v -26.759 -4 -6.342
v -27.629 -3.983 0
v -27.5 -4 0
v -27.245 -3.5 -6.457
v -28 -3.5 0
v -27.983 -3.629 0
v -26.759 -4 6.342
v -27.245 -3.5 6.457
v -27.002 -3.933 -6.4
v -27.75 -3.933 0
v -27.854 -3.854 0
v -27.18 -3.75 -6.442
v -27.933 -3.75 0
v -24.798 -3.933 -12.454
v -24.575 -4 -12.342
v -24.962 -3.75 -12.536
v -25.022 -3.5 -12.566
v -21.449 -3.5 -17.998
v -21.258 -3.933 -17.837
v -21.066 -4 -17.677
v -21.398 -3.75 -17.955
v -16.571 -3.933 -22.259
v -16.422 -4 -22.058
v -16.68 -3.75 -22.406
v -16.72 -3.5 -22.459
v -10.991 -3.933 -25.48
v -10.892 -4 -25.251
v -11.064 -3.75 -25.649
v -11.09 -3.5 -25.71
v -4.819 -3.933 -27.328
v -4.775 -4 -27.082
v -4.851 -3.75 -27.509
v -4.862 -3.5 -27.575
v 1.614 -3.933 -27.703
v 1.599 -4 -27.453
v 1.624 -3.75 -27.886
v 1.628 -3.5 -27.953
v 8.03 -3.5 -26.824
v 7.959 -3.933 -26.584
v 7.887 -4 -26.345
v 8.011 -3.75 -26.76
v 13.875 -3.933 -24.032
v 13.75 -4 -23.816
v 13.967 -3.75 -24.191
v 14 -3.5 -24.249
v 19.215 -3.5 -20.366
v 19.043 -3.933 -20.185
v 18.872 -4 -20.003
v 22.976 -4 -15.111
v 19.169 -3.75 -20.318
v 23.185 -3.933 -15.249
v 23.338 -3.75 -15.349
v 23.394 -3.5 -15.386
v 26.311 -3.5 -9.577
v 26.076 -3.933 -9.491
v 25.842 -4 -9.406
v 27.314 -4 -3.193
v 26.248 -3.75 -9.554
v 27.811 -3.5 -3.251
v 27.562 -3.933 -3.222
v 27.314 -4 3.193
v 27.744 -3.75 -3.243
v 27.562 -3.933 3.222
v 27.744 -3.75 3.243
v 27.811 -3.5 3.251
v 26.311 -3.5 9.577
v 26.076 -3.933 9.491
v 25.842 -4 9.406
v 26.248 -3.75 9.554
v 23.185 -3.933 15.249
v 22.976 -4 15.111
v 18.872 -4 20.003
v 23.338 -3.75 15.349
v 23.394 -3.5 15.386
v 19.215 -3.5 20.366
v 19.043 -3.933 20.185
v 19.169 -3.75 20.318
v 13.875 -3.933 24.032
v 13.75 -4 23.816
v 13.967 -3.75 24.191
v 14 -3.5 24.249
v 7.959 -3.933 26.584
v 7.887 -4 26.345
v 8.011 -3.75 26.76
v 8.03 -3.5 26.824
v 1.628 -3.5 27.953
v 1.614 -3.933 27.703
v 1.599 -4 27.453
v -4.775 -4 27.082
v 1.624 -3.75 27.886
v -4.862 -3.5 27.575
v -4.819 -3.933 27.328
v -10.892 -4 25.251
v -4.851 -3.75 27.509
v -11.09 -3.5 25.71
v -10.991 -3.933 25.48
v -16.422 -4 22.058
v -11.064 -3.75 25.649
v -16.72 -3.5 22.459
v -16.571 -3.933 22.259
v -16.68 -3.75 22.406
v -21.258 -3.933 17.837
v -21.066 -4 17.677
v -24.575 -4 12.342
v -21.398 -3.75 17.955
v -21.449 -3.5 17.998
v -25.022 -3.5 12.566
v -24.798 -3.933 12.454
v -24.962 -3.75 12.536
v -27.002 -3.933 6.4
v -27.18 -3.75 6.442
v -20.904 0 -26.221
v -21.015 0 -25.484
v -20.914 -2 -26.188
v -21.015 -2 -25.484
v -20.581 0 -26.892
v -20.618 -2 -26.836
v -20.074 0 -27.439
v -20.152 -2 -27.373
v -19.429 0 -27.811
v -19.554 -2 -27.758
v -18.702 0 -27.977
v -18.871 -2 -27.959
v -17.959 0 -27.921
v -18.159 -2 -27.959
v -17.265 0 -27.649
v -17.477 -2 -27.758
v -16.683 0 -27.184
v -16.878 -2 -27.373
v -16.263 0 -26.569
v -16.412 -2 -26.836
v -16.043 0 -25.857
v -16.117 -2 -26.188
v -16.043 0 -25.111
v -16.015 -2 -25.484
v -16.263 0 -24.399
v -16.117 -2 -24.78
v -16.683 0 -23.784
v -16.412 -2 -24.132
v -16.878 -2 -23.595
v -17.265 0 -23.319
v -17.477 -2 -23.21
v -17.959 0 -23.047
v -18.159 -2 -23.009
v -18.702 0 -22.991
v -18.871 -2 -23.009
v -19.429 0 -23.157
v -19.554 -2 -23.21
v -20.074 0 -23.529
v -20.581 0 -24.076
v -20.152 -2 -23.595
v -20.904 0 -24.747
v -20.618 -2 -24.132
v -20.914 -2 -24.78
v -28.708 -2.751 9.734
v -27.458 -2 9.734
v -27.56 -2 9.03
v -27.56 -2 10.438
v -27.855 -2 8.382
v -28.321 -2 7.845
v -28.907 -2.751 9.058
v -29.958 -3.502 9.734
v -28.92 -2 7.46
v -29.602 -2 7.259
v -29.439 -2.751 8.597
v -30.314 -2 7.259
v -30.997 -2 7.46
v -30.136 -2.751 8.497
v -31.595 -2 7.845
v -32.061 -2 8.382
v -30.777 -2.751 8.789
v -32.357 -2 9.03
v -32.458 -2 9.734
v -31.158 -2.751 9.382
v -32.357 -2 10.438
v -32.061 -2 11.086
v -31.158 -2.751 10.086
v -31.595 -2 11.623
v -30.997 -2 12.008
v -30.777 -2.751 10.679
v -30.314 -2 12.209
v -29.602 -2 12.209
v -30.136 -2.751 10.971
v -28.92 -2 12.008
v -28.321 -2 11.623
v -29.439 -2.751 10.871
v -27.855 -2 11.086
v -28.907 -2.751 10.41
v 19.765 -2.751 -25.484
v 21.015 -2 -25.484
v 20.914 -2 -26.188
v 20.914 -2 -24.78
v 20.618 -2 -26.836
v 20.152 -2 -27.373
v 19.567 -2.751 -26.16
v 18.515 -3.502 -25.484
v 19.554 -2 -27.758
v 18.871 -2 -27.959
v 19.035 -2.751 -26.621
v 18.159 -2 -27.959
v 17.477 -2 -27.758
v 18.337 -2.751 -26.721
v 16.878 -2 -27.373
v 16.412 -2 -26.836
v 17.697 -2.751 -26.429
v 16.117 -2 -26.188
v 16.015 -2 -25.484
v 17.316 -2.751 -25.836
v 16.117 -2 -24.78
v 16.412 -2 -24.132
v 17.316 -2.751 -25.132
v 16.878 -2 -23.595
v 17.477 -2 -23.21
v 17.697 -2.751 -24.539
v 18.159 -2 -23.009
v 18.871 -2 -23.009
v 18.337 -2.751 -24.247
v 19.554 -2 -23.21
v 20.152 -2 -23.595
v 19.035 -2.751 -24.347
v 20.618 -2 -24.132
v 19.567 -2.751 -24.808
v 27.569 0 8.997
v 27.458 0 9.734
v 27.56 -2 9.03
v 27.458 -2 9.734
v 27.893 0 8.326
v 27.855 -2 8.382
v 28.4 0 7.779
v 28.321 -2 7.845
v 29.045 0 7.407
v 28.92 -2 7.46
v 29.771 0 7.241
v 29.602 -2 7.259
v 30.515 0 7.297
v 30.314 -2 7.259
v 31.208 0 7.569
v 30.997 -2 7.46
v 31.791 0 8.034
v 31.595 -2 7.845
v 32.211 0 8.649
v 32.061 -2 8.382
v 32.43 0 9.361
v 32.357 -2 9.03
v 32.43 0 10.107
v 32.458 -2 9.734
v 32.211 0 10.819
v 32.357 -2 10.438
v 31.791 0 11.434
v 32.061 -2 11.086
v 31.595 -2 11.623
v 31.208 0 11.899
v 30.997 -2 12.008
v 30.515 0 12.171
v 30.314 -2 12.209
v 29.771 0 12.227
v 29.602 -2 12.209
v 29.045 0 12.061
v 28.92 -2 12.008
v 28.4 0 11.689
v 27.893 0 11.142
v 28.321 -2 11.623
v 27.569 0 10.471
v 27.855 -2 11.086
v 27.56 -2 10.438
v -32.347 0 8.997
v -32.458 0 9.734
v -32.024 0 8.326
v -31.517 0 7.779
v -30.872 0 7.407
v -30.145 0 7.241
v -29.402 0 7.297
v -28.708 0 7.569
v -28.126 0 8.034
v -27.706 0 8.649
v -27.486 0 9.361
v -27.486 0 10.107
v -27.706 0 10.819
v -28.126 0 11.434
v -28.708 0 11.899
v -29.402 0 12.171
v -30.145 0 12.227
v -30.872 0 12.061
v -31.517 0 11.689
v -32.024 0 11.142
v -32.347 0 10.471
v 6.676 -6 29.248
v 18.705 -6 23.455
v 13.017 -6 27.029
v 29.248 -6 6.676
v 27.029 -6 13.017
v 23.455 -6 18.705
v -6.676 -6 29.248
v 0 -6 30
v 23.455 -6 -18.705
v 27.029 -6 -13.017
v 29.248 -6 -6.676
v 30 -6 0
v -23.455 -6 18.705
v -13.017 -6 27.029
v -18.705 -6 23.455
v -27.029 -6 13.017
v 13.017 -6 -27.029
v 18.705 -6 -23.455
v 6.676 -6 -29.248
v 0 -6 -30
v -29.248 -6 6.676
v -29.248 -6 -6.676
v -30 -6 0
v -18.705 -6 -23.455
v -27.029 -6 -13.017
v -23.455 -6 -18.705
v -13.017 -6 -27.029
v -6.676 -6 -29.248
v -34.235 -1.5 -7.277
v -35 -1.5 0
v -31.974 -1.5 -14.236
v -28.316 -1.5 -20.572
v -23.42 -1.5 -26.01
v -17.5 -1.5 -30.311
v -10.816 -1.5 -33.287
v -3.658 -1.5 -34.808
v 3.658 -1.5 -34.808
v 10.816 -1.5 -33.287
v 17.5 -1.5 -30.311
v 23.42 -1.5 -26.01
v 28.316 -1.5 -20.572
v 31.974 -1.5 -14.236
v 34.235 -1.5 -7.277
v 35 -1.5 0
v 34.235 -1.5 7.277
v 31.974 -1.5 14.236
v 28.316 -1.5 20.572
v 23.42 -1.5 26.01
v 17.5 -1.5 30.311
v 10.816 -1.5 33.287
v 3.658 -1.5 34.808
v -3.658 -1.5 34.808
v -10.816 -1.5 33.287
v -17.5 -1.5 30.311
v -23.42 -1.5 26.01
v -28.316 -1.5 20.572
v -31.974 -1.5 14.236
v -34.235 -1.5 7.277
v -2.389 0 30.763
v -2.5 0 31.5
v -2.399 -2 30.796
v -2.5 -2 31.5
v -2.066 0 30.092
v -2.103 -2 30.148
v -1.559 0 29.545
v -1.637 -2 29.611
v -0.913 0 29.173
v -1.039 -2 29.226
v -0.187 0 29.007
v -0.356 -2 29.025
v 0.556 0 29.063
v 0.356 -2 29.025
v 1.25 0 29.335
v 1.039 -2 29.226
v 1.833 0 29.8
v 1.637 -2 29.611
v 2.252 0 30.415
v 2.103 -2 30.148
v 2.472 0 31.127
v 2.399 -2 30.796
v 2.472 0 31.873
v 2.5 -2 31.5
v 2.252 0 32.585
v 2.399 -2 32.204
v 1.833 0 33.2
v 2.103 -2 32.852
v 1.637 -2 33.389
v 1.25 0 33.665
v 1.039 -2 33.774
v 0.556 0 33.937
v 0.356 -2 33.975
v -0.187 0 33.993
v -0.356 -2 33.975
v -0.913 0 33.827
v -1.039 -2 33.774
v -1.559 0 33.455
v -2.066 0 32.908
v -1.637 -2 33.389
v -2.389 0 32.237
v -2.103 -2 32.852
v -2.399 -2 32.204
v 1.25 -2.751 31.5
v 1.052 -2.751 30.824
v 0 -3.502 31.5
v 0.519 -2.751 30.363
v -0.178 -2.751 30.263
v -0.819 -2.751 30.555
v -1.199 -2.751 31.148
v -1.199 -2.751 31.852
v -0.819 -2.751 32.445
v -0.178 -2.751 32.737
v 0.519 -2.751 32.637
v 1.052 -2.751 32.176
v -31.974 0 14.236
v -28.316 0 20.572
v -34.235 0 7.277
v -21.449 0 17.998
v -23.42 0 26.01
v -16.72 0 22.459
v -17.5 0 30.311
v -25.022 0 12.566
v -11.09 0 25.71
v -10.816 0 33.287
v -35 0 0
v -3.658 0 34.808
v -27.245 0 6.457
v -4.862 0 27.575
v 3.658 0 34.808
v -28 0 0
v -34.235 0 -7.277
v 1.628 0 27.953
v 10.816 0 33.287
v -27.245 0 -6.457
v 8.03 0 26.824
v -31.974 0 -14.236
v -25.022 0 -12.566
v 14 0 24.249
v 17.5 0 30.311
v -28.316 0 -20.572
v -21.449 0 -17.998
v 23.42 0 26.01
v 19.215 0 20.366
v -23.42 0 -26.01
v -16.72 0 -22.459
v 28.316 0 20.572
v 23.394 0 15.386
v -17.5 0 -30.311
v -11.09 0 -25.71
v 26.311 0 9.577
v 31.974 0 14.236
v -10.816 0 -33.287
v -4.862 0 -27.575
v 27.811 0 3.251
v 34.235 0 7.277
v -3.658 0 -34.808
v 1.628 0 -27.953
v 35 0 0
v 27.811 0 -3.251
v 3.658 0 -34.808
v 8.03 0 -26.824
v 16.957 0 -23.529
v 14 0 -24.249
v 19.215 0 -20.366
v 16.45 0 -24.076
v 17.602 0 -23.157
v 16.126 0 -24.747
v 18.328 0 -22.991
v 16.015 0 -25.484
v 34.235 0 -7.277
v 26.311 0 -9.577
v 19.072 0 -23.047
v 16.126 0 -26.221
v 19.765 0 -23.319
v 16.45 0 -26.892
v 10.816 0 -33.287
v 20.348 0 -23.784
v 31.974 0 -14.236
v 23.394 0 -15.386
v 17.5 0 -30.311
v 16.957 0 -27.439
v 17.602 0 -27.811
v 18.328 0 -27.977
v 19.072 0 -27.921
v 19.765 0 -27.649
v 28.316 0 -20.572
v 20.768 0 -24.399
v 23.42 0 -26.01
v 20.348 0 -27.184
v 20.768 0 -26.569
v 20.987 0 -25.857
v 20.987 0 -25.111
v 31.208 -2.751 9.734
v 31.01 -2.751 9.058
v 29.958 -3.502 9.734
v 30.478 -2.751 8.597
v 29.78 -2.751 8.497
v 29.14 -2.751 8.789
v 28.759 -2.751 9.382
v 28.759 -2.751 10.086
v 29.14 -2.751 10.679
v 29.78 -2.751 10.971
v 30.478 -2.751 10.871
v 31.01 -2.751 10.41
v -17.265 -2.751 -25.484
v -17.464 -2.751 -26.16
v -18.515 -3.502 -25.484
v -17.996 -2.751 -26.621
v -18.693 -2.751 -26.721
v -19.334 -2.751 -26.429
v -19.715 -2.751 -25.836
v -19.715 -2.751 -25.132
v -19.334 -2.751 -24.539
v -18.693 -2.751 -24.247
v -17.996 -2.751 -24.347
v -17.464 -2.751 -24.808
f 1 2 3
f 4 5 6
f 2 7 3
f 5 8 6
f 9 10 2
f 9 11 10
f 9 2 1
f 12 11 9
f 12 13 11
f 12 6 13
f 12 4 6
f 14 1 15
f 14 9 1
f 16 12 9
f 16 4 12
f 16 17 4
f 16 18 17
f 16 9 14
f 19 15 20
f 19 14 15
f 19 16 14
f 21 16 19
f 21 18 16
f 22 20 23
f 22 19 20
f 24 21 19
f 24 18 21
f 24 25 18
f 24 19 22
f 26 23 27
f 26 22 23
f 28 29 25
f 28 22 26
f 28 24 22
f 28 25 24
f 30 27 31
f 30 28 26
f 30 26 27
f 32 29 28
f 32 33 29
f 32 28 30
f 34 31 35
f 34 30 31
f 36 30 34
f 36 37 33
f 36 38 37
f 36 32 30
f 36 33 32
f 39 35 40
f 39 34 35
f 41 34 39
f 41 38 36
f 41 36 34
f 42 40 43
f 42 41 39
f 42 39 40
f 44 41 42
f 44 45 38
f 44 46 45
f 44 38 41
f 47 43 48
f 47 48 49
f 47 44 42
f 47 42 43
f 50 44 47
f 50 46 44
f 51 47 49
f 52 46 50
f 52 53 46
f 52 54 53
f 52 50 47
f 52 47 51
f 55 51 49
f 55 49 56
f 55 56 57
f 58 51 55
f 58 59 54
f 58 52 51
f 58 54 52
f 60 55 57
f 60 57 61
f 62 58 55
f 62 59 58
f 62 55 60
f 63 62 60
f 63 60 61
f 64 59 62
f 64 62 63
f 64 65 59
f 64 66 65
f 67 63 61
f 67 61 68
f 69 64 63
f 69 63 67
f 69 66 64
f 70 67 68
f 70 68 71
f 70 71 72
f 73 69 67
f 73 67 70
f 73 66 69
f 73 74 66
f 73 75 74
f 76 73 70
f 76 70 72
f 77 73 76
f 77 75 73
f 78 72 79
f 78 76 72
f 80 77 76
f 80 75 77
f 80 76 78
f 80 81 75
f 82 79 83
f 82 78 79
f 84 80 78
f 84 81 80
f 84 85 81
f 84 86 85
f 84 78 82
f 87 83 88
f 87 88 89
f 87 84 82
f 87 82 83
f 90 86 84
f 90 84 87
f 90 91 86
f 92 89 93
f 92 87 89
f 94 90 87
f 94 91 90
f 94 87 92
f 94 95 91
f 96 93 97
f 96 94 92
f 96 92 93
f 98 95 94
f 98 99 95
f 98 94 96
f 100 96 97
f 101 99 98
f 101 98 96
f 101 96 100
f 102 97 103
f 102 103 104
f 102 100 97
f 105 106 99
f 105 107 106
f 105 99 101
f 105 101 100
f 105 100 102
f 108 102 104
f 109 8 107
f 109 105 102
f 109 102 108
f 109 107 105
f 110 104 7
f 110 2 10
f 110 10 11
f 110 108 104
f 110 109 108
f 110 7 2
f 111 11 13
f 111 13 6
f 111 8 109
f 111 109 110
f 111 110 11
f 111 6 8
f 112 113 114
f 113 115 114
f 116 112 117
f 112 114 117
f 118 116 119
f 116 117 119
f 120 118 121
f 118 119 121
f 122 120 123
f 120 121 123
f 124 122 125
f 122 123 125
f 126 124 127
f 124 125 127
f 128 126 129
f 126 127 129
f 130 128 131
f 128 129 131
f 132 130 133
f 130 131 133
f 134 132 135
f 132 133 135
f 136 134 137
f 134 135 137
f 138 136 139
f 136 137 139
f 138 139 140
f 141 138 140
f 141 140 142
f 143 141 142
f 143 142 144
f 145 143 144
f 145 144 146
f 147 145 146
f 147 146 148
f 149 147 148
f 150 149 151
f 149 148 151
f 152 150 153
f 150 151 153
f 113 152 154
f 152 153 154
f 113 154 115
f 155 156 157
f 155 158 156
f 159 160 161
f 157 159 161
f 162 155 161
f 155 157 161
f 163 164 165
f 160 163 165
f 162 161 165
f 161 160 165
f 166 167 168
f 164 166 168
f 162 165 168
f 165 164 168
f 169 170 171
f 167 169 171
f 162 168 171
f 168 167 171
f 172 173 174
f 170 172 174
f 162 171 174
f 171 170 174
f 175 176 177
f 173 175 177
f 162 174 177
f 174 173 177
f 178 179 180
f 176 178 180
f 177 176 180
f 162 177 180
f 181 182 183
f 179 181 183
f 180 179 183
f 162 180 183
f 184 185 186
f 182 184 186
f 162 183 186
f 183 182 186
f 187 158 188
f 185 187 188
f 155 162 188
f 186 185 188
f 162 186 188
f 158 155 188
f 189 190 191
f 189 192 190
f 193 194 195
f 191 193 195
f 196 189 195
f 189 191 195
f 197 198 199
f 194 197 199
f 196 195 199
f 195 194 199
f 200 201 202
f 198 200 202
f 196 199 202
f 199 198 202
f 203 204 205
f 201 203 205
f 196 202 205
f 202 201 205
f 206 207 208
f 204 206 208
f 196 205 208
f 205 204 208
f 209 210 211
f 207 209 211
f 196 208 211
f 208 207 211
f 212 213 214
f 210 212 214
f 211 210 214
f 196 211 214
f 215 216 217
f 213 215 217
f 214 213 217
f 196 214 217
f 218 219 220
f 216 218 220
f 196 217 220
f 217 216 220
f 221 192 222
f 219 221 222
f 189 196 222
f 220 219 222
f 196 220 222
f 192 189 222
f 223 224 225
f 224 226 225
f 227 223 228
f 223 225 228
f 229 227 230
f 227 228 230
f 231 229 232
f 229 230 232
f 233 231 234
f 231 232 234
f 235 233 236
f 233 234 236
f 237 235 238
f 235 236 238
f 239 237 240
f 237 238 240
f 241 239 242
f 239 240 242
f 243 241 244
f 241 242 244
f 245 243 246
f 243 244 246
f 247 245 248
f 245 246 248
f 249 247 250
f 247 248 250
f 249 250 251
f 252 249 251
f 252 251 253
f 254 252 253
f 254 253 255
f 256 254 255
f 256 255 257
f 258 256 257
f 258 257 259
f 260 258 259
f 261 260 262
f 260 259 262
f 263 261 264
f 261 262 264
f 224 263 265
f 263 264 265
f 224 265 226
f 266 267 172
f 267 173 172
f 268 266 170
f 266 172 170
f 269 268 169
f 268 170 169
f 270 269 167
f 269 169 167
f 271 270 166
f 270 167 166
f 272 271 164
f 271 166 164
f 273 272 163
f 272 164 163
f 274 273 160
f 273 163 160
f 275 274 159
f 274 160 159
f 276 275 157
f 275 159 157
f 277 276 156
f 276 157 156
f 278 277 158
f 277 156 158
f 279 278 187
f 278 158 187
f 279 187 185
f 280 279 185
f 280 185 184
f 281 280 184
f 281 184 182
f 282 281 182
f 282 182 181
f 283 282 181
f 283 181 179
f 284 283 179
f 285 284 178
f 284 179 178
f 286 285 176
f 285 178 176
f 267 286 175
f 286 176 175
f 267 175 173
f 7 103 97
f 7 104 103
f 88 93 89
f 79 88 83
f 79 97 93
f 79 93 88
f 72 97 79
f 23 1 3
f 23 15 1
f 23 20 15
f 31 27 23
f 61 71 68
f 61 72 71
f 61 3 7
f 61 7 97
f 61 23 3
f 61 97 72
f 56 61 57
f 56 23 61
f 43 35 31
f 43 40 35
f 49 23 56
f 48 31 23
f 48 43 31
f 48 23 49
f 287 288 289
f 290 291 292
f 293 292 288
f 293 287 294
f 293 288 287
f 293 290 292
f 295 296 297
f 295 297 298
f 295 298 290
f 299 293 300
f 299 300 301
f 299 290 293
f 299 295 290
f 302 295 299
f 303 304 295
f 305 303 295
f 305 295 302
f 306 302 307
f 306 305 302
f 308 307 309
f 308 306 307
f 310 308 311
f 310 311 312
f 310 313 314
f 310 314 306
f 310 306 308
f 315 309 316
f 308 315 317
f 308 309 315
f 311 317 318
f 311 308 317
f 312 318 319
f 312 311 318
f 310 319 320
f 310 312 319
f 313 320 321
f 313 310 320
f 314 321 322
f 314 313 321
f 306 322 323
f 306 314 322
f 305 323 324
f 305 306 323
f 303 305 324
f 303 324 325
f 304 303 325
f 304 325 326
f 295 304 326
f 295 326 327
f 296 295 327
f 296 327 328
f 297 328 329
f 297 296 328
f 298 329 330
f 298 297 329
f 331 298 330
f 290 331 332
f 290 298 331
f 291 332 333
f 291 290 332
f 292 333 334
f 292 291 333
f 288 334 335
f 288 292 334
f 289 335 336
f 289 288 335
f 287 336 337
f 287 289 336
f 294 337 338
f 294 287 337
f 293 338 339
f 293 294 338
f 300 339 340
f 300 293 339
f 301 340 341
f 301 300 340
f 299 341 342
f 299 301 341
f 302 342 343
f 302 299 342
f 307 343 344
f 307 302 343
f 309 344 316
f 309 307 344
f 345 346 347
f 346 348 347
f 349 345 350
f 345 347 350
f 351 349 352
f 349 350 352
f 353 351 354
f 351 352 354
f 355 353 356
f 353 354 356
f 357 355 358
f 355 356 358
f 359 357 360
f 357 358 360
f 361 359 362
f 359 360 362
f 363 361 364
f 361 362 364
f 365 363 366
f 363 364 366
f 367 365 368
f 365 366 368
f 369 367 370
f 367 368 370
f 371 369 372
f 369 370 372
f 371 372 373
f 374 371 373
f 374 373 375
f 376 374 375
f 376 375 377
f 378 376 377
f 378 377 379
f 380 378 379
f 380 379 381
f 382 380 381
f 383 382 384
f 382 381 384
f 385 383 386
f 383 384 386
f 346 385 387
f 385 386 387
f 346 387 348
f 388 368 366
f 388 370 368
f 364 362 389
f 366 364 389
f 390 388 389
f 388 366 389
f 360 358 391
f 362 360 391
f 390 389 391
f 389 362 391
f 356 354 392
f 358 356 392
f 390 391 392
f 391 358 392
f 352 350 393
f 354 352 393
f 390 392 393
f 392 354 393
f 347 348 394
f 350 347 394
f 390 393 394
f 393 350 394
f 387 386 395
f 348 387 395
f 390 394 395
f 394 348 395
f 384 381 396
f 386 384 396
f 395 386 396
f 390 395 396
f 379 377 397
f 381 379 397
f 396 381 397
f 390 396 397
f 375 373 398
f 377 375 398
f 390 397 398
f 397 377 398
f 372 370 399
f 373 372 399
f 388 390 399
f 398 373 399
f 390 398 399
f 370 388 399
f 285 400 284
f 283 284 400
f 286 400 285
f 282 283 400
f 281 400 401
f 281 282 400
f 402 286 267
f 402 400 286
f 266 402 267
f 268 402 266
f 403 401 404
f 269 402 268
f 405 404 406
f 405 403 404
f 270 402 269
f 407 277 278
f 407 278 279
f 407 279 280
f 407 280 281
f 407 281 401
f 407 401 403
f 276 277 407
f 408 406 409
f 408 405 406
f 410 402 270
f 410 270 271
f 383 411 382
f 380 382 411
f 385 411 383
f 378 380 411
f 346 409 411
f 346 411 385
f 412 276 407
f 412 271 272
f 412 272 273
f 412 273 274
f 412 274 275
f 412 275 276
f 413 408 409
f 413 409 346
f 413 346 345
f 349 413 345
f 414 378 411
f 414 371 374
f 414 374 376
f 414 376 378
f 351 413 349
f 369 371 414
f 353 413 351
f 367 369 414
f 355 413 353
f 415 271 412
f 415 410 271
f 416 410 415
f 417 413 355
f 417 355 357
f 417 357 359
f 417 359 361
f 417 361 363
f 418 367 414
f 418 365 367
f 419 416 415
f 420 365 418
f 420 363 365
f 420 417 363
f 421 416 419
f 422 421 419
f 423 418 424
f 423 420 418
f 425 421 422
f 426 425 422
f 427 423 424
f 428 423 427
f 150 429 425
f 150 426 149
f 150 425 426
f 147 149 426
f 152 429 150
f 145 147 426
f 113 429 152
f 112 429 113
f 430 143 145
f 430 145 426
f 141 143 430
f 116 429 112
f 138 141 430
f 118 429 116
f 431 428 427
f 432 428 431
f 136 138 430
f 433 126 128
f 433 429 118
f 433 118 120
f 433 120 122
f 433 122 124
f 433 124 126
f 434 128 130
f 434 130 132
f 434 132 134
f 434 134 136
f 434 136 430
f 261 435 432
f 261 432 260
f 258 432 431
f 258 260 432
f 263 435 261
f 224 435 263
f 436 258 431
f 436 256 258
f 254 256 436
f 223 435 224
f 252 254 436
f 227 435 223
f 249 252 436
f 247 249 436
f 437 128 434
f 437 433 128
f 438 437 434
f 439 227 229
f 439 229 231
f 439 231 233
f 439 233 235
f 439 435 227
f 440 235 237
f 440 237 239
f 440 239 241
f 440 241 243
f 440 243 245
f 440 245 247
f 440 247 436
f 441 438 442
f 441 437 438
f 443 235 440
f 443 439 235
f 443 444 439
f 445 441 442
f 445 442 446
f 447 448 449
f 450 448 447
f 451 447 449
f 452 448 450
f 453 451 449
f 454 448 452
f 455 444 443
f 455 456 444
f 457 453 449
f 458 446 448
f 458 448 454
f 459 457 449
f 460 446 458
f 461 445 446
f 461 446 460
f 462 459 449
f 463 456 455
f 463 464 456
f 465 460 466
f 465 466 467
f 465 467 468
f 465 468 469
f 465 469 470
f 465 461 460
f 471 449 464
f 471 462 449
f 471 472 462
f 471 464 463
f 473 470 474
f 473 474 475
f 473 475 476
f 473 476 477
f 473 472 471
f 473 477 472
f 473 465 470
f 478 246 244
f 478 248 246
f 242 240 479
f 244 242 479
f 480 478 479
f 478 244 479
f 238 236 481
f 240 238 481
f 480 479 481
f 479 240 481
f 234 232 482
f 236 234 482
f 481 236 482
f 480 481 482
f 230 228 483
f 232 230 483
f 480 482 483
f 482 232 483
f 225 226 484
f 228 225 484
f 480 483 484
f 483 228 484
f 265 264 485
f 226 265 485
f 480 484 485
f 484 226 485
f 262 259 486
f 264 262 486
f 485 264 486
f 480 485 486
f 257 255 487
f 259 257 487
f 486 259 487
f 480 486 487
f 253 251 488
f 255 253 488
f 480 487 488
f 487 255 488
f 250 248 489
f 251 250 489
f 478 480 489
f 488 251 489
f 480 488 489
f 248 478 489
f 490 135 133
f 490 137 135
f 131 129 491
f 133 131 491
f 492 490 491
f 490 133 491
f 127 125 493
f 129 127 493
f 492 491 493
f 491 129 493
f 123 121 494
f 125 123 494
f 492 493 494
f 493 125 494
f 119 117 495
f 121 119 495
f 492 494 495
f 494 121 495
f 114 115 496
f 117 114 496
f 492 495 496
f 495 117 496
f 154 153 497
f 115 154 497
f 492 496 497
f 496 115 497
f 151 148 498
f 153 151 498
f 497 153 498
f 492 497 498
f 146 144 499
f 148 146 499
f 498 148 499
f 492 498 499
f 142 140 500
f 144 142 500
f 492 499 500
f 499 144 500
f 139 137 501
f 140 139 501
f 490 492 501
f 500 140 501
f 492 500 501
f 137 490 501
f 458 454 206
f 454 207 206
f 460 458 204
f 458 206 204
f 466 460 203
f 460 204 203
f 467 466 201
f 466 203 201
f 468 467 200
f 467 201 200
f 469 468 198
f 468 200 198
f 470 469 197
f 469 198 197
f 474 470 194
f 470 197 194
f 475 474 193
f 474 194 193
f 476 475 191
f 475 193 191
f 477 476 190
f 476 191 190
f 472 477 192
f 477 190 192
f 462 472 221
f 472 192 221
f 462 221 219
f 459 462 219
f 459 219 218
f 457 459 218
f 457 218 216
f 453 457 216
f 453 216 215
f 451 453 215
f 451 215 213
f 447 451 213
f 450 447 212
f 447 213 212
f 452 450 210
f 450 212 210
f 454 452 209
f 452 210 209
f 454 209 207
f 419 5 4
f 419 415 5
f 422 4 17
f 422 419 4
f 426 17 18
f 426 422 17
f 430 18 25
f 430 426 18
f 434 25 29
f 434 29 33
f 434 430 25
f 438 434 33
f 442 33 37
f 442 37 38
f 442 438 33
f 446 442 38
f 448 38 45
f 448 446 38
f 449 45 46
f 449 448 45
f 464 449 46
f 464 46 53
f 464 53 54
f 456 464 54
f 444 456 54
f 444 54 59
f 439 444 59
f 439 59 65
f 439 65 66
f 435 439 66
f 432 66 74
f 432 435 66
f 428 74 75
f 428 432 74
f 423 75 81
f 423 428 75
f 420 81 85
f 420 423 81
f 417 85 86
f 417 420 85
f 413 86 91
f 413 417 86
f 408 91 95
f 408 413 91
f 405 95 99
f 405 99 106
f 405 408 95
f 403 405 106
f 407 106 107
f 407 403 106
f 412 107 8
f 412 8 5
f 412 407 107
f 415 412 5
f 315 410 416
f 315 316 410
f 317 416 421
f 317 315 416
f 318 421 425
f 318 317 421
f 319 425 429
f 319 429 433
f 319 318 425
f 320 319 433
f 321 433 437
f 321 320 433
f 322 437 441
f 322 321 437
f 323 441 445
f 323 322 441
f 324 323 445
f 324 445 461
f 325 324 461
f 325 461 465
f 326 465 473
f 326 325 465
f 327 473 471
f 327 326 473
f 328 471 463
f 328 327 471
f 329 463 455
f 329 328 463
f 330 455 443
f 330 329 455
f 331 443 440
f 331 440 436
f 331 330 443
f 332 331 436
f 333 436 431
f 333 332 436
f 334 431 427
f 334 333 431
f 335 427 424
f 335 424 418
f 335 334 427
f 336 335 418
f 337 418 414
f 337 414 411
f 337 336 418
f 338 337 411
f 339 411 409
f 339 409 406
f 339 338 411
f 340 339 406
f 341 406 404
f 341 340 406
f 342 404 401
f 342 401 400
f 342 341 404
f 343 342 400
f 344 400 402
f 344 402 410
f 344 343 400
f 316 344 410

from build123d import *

# Parameters (mm, degrees)
F3_D     = 5
F3_DEPTH = 2
F3_TIP   = 1.5021515476


with BuildPart() as f1:
    # F0 (on Top) → F1 (revolve)
    with BuildSketch(Plane.XY):
        with BuildLine():
            Line((-28, 0), (-35, 0))
            Line((-35, 0), (-35, -1.5))
            Line((-35, -1.5), (-30, -6))
            Line((-30, -6), (0, -6))
            Line((0, -6), (0, -4))
            Line((0, -4), (-27.5, -4))
            ThreePointArc((-27.5, -4), (-27.8535533906, -3.8535533906), (-28, -3.5))
            Line((-28, -3.5), (-28, 0))
        make_face()
    revolve(axis=Axis((0, -2.242507413, 0), (0, -1, 0)))

    # F3
    with Locations(Plane(origin=(0, 0, 0), x_dir=(1, 0, 0), z_dir=(0, 1, 0))):
        with Locations((0, -31.5), (29.9582802633, -9.7340353228), (18.5152354472, 25.4840353228), (-18.5152354472, 25.4840353228), (-29.9582802633, -9.7340353228)):
            Hole(F3_D / 2, depth=F3_DEPTH)
            with Locations((0, 0, -(F3_DEPTH + F3_TIP / 2))):  # 118° drill point
                Cone(0, F3_D / 2, F3_TIP, mode=Mode.SUBTRACT)


solid = f1.part
